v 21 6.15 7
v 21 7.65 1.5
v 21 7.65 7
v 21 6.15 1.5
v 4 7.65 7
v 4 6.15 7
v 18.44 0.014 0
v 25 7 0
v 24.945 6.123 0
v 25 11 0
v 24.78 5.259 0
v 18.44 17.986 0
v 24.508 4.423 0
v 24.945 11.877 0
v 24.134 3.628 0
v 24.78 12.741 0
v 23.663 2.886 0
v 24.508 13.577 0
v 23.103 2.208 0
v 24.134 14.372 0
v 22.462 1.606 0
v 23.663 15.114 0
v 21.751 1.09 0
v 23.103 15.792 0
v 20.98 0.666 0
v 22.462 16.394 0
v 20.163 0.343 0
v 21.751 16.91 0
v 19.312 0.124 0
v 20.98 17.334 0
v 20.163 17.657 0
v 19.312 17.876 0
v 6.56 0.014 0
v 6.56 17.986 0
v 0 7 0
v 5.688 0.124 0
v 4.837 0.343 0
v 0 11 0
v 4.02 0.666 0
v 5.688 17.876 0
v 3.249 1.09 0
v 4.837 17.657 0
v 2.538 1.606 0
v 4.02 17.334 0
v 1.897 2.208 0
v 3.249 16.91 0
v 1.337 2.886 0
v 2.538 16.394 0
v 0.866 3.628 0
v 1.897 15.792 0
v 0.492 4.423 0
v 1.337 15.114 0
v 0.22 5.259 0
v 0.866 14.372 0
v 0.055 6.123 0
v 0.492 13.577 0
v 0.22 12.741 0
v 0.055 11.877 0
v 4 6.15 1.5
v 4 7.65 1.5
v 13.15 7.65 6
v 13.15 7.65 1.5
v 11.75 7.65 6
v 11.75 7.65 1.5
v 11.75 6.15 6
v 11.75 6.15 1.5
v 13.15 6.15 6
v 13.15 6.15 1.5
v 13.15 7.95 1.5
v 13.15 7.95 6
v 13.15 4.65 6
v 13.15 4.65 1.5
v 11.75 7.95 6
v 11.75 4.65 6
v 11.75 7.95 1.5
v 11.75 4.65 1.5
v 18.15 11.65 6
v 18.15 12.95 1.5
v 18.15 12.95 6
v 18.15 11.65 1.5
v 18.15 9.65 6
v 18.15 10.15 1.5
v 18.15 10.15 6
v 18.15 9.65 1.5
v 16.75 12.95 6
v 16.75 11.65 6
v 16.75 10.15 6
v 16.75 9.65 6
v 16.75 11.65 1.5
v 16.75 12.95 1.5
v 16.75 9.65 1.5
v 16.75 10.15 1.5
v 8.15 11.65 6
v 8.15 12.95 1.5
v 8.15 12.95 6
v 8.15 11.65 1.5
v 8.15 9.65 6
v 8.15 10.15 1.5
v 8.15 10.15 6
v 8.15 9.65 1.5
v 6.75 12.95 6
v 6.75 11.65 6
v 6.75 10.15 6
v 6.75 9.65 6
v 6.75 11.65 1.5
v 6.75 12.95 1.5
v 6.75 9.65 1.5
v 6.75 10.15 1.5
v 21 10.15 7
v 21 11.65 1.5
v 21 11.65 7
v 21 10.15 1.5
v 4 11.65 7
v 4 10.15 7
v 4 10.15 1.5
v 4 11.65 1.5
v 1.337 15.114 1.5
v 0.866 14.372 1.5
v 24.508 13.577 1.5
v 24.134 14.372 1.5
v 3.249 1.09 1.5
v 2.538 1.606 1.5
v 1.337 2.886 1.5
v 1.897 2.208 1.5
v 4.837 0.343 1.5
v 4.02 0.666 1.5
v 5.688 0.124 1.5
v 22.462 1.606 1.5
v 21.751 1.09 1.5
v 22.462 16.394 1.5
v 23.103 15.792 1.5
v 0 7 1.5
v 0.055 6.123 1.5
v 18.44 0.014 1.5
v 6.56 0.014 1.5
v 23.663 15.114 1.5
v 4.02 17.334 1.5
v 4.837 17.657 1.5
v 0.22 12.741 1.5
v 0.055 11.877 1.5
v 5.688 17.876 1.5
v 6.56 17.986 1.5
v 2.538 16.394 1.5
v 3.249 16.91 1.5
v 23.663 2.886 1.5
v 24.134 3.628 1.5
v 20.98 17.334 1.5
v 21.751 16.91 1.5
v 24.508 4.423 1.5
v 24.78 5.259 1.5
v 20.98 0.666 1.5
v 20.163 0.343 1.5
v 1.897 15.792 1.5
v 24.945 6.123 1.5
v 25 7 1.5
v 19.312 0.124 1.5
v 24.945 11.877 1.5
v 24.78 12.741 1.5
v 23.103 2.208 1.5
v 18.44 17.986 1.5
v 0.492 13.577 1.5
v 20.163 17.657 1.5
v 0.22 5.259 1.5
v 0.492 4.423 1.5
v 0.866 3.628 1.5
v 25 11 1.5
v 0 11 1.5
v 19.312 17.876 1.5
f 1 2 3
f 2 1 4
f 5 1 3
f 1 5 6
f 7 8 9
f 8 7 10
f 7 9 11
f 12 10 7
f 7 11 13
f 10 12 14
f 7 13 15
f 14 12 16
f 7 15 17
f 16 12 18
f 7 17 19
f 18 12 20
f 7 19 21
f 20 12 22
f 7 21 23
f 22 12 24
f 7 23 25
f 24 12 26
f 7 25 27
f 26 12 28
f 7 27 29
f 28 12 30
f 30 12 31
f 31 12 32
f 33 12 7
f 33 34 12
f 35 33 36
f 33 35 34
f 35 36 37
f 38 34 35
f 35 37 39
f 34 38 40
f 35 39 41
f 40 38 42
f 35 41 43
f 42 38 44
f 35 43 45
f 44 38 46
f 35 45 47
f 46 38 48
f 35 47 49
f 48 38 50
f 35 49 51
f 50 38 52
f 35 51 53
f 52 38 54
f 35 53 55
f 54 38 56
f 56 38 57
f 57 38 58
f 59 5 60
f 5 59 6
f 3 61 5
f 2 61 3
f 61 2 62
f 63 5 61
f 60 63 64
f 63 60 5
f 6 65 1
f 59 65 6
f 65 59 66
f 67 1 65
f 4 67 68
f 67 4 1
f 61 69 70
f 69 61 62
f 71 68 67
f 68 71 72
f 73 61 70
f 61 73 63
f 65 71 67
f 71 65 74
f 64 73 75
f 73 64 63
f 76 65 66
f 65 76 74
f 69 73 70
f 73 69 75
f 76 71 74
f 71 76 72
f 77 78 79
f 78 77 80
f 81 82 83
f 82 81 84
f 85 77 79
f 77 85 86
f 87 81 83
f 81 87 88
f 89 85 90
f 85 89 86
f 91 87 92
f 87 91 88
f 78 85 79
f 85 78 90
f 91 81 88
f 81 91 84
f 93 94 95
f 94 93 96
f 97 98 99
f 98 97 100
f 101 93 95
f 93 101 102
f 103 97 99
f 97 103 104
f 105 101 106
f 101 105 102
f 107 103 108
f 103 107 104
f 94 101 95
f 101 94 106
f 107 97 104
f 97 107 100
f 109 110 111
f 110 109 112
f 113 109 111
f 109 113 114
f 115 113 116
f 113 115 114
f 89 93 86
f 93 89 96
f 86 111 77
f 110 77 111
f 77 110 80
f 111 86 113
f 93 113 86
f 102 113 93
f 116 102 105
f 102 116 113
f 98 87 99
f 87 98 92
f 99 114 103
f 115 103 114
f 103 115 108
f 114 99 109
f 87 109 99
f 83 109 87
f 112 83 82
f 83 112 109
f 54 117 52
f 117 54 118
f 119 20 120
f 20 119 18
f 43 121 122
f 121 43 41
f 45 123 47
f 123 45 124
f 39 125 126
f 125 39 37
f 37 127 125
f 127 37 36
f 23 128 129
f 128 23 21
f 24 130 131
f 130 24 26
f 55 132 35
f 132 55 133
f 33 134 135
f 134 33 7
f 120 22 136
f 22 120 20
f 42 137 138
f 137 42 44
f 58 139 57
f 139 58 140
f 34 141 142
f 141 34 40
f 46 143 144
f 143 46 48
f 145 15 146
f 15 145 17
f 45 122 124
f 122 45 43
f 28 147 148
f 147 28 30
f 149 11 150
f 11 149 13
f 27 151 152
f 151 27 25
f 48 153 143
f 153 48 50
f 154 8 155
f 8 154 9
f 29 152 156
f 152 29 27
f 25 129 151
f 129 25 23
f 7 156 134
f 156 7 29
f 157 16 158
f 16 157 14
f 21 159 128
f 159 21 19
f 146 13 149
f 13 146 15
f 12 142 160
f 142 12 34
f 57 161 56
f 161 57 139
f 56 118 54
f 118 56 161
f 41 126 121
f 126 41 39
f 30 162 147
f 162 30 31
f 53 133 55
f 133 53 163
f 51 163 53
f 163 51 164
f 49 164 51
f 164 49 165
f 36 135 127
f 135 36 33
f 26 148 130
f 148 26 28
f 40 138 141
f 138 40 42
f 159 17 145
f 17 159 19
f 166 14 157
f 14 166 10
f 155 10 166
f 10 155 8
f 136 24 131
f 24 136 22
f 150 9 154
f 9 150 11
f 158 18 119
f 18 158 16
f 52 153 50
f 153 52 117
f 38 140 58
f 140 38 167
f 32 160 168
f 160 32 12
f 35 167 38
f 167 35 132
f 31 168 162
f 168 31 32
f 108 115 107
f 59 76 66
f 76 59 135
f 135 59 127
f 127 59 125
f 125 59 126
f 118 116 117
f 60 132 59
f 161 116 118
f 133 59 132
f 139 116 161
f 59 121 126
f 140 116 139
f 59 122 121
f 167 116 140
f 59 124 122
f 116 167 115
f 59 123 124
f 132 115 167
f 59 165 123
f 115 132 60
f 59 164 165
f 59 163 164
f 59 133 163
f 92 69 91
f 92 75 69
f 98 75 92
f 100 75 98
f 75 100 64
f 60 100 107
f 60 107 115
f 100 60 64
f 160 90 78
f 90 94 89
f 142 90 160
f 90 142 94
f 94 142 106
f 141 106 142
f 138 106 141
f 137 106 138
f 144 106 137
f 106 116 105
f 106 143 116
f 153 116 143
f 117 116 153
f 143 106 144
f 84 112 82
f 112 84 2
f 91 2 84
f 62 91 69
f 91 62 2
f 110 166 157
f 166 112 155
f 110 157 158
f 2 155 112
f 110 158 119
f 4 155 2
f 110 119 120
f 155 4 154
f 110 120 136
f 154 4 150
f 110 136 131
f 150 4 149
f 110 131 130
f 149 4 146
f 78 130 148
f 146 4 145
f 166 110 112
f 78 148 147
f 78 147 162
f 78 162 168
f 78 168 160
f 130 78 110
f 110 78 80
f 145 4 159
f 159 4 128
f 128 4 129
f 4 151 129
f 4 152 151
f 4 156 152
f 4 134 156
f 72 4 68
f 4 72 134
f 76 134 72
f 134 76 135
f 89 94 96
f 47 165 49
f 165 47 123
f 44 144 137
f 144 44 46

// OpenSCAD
$fn=50;

// base place with round corners
translate([7,7,0])
    minkowski() {
        cube([11,4,0.75]);
        cylinder(r=7,h=0.75);
    };


translate([4,5.4+0.75,0]) {
    cube([17,1.5,7]);
    translate([7.75,-1.5,0])
        cube([1.4,3.3,6]);
    translate([12.75,3.5,0])
        cube([1.4,3.3,6]);
        translate([2.75,3.5,0])
        cube([1.4,3.3,6]);
    translate([0,4,0])
        cube([17,1.5,7]);
}
